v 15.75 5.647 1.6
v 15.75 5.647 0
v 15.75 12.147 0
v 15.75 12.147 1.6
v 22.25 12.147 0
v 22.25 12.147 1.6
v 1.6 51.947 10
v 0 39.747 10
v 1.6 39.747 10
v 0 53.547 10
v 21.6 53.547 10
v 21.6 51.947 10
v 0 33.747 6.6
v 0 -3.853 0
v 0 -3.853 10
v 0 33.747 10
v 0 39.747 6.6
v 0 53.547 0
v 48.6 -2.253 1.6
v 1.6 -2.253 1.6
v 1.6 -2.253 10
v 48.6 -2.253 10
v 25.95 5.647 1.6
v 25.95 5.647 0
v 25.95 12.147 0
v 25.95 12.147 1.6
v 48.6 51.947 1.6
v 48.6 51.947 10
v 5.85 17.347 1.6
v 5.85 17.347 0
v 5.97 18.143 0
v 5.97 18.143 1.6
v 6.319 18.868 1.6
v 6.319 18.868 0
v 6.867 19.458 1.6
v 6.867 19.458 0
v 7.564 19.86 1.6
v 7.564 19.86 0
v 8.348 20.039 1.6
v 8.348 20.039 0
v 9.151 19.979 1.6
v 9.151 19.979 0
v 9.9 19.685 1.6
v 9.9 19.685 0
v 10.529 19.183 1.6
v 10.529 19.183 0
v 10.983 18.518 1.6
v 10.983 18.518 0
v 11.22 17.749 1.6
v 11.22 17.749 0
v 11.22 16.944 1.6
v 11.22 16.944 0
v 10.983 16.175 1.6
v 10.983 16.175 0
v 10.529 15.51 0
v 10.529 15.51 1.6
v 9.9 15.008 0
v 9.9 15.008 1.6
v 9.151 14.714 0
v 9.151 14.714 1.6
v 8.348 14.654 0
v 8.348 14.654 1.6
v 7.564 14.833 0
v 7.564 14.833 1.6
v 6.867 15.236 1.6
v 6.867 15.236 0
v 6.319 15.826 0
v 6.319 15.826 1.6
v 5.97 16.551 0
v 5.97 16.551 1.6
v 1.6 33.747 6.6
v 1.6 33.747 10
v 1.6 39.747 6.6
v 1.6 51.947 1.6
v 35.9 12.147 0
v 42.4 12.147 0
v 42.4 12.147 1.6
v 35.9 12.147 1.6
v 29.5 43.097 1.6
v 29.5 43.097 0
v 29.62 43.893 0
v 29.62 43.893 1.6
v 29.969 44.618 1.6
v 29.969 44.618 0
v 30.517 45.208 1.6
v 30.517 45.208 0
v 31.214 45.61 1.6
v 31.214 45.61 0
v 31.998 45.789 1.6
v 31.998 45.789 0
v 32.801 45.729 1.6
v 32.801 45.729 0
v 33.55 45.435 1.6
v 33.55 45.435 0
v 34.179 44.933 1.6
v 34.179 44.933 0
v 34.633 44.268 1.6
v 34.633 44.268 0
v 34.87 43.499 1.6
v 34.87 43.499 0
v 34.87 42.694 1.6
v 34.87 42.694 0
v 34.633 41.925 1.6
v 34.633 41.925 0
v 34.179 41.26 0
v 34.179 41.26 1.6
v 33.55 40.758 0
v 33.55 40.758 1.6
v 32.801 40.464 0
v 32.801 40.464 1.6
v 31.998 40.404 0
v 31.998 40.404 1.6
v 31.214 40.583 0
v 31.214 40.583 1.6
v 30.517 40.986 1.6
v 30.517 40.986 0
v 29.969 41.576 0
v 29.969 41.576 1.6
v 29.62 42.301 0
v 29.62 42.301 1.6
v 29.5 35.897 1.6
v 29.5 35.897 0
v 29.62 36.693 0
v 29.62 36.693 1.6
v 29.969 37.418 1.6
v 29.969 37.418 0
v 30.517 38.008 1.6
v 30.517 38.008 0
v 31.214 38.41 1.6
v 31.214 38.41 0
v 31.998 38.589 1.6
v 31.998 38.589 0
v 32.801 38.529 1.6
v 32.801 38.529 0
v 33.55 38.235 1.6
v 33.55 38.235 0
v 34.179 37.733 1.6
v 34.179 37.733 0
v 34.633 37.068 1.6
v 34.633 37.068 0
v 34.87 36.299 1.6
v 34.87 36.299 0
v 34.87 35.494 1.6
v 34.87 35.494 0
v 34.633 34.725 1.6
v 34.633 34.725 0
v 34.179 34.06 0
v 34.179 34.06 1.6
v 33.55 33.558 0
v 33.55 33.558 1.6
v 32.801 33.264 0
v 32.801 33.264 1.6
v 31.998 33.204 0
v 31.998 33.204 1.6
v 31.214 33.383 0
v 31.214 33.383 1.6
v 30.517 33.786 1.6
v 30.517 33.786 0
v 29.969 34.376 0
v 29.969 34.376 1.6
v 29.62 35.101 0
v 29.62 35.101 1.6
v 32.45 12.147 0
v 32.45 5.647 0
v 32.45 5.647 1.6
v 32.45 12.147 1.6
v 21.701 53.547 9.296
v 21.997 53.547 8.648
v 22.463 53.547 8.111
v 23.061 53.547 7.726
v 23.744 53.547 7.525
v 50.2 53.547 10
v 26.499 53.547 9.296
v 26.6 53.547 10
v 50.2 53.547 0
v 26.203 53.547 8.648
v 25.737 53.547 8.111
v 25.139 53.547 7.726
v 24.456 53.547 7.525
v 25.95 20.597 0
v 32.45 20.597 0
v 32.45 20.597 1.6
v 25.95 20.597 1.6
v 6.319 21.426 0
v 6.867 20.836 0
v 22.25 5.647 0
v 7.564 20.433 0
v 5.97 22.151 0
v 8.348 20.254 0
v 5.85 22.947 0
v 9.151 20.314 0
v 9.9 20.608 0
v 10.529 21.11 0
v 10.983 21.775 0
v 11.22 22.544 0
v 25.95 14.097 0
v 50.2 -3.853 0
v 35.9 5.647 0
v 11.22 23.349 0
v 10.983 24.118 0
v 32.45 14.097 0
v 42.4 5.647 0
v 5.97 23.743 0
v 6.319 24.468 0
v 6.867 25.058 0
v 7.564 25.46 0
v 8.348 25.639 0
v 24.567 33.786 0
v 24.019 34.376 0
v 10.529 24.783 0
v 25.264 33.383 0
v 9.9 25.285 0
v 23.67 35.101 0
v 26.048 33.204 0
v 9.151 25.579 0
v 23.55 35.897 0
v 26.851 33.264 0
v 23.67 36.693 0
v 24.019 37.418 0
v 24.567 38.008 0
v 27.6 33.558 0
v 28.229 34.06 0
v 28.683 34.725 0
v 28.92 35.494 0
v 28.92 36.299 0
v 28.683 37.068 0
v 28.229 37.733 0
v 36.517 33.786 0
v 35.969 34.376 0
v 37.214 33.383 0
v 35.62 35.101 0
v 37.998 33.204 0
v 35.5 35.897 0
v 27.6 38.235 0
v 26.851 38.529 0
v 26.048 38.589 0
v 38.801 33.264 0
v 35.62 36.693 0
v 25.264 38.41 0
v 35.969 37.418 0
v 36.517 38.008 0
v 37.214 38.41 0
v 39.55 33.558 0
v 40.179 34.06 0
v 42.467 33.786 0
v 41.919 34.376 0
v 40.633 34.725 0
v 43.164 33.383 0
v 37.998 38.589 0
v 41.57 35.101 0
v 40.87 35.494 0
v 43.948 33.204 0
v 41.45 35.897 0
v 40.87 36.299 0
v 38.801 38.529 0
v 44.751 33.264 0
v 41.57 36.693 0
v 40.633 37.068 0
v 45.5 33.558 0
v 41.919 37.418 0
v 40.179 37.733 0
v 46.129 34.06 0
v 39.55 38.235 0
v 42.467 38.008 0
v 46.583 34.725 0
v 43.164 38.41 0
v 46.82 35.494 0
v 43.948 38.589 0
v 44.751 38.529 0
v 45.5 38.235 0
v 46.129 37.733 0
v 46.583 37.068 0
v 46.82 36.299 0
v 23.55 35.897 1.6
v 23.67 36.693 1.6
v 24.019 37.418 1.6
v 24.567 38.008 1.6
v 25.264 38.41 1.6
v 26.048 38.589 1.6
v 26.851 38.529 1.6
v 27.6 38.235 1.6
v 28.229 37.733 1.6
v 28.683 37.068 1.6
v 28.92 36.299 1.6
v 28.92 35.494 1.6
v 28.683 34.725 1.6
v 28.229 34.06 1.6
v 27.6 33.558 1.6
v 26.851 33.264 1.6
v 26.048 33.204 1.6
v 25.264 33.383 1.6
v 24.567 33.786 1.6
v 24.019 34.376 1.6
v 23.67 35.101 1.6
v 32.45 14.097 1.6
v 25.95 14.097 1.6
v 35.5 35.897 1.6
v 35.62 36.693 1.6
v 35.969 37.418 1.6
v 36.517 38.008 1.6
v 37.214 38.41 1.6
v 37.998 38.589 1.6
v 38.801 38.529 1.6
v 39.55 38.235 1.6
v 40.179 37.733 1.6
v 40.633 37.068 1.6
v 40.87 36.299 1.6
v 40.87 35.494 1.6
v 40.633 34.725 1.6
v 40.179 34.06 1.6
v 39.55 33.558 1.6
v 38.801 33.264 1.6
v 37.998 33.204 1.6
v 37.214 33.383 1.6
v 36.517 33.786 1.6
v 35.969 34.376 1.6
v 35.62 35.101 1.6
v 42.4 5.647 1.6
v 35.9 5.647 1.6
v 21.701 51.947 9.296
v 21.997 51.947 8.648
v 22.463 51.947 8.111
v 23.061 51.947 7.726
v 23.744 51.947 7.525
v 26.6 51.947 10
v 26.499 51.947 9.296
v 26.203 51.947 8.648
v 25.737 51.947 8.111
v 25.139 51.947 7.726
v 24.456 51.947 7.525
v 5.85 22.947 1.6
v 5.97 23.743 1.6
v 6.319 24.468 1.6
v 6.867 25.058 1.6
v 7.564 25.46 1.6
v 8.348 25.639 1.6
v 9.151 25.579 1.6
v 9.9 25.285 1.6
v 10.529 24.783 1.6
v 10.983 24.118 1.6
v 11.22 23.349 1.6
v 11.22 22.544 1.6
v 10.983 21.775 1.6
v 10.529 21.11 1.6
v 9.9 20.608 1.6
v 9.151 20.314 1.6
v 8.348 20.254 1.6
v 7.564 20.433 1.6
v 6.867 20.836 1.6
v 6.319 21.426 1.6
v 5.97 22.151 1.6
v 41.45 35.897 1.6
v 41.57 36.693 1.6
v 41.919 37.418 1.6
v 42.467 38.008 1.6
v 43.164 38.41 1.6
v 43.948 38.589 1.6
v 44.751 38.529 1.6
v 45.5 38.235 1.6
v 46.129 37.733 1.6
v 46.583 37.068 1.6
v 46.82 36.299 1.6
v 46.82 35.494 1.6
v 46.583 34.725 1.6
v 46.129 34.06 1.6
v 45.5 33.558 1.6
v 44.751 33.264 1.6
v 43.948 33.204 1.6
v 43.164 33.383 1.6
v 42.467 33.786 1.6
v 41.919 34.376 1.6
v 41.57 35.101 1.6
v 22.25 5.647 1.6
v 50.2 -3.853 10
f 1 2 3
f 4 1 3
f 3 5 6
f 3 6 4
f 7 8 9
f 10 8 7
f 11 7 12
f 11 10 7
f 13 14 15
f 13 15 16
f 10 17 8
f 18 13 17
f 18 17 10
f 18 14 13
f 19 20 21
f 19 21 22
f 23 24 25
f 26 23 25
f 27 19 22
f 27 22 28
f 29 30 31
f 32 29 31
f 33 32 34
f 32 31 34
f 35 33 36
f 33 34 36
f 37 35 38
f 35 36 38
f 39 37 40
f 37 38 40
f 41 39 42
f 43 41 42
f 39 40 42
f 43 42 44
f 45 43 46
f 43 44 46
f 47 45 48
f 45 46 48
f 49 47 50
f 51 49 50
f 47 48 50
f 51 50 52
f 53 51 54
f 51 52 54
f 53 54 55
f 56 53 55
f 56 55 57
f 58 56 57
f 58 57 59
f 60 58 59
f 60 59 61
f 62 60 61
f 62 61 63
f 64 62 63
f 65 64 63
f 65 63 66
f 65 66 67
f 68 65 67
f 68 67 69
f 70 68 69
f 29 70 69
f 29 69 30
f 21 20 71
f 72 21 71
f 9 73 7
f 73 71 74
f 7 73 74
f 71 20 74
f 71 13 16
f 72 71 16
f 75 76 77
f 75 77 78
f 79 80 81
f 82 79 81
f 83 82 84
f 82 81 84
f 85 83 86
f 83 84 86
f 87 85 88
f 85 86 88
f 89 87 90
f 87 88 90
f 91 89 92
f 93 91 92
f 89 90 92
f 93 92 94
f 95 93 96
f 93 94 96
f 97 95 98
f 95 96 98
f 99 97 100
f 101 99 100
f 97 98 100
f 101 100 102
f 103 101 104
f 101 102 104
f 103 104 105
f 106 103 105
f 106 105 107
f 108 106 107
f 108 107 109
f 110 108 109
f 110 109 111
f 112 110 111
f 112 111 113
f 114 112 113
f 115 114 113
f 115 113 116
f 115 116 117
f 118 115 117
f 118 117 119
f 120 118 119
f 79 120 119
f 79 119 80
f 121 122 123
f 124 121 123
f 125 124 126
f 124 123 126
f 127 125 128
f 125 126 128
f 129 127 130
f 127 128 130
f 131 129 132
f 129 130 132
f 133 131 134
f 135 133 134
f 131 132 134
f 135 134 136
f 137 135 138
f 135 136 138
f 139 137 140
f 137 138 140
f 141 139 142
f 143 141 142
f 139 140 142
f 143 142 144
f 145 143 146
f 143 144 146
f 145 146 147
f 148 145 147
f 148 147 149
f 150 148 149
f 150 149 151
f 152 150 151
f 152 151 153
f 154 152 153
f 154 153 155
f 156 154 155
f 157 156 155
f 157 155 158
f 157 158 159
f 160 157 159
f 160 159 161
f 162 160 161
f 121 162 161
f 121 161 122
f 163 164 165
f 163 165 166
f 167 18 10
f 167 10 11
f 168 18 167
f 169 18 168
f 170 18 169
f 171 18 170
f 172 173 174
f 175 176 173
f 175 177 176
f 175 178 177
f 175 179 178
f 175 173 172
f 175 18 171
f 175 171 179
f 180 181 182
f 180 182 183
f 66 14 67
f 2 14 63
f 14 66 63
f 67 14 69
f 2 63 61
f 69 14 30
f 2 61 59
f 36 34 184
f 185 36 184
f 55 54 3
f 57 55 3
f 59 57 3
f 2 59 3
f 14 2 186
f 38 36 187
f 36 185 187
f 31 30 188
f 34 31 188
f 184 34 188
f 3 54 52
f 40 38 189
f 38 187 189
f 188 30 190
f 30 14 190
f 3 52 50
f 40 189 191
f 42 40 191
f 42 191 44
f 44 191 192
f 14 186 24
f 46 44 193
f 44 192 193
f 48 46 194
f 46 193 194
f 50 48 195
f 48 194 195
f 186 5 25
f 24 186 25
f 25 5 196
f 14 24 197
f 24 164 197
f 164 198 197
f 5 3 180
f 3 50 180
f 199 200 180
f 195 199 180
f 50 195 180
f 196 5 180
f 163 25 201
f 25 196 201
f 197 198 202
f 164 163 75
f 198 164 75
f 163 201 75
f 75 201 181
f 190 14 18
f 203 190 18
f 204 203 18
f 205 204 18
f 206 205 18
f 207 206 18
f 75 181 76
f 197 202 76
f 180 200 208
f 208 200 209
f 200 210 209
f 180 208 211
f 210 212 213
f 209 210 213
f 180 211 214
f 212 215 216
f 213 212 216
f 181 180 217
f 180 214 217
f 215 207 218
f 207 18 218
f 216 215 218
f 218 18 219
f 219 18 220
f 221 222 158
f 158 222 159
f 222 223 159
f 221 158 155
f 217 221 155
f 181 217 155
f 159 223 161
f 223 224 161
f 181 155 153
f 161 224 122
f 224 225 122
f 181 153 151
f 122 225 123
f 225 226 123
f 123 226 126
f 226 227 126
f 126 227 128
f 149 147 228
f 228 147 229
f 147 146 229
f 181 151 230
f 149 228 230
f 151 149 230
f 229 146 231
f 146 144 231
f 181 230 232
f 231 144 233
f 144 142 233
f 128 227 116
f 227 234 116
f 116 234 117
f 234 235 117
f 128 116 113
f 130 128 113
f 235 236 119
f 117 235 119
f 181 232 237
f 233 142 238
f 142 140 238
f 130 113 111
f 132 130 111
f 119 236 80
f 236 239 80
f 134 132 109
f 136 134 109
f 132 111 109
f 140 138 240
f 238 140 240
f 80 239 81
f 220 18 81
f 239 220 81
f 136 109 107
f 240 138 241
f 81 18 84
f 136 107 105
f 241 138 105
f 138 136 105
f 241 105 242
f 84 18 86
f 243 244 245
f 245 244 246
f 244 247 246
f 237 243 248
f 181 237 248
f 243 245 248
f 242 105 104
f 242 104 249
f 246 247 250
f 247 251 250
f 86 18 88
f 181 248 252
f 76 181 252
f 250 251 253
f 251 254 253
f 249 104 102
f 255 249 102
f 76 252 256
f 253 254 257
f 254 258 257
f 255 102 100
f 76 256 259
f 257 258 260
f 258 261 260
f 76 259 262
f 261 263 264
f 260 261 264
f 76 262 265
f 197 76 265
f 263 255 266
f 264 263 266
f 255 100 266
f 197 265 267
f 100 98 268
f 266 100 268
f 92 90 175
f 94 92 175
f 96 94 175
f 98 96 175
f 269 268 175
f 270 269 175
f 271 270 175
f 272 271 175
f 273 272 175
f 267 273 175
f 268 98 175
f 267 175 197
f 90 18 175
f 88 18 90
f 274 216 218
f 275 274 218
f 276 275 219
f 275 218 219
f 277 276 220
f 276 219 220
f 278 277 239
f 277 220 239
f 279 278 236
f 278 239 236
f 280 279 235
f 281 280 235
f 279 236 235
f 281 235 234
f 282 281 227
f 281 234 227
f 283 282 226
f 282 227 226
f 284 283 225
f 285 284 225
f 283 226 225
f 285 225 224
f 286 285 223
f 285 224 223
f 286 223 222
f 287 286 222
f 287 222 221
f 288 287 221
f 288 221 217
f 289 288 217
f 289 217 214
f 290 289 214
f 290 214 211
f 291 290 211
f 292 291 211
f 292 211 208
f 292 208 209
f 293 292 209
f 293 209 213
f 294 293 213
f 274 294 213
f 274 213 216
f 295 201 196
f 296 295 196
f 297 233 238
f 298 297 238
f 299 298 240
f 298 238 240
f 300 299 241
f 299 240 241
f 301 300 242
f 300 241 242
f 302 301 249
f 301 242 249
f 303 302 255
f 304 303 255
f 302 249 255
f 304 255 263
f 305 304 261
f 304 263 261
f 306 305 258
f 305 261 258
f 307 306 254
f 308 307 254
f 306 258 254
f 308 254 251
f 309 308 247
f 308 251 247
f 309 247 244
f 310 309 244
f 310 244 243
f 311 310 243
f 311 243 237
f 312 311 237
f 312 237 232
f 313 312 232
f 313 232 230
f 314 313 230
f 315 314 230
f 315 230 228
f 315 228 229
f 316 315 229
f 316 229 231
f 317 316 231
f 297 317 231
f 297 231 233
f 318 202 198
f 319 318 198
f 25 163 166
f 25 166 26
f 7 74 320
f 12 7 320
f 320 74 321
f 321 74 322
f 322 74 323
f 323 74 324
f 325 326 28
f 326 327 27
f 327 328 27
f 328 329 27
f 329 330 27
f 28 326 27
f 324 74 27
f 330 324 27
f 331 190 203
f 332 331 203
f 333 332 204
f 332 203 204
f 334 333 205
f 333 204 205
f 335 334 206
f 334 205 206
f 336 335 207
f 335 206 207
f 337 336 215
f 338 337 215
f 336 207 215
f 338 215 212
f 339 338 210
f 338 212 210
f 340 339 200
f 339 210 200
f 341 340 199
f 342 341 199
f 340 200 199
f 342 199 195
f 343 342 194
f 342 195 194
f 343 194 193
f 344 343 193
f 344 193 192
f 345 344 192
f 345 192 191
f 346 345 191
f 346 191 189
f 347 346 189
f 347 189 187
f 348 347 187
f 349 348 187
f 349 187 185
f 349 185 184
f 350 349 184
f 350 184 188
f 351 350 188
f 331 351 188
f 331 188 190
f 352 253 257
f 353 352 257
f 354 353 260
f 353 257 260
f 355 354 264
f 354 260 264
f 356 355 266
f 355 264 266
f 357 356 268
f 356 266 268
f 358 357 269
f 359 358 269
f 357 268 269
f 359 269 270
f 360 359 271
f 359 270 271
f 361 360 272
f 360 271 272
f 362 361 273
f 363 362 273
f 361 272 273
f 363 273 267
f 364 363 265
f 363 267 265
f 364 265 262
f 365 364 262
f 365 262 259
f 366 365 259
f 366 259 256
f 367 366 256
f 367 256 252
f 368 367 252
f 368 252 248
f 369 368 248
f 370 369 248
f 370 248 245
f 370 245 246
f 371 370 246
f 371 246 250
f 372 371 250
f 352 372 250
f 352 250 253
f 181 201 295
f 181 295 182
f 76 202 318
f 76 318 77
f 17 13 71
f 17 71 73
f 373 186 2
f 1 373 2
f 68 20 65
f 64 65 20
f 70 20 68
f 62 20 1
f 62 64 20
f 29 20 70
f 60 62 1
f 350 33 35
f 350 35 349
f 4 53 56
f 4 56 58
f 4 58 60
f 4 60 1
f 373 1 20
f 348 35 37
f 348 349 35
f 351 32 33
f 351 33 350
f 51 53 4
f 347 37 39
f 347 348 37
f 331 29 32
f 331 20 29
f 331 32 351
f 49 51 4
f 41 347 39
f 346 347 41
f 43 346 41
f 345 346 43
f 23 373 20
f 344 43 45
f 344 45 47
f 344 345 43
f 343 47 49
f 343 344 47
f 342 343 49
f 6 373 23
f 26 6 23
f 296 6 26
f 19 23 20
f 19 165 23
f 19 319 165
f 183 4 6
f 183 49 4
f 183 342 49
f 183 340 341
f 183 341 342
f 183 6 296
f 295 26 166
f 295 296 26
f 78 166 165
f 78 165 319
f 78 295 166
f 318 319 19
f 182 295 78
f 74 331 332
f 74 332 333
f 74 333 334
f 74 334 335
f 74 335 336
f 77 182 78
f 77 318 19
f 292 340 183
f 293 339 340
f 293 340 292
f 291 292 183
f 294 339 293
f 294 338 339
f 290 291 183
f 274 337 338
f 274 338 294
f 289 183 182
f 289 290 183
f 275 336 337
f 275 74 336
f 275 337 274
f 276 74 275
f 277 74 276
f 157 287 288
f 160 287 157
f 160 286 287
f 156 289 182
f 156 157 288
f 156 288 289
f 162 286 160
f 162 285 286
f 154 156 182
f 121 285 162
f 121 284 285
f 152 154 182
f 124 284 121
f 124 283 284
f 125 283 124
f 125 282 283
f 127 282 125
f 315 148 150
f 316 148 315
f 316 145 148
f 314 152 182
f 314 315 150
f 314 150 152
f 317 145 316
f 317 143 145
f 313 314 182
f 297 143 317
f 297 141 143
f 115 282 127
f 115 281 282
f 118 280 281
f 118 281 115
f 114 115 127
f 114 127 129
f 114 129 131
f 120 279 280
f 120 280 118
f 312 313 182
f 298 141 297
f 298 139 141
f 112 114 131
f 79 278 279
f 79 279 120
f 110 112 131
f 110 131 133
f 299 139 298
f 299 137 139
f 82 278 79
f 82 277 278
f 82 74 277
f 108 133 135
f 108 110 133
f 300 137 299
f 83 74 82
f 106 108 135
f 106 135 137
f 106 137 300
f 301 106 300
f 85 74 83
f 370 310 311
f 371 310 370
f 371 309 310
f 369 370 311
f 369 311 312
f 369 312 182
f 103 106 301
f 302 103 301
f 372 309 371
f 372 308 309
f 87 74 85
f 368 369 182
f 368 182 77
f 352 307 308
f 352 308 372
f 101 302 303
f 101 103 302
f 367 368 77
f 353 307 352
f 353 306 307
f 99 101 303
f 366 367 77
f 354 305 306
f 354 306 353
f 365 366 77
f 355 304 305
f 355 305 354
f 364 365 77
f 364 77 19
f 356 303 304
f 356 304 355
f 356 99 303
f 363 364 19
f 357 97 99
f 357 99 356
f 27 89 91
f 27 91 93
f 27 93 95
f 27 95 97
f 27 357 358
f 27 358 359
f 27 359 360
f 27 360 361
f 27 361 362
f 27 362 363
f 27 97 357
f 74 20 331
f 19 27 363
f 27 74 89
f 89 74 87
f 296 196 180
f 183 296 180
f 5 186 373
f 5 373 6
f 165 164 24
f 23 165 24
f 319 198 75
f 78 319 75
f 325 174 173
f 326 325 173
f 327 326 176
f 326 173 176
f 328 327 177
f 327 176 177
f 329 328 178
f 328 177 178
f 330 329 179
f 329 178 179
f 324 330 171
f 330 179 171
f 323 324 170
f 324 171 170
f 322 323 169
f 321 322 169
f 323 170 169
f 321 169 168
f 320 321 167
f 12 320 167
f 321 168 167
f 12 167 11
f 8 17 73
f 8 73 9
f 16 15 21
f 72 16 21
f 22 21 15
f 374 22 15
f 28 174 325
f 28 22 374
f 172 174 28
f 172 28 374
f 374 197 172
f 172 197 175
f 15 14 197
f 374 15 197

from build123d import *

# Parameters (mm, degrees)
SKETCH1_W           = 50.2
SKETCH1_H           = 57.4
BOSS_EXTRUDE1_DEPTH = 10
SHELL1_T            = -1.6
SKETCH2_R           = 2.7
CUT_EXTRUDE1_DEPTH  = 10
SKETCH3_W           = 3.4
SKETCH3_H           = 6
CUT_EXTRUDE2_DEPTH  = 10
SKETCH4_R           = 2.5
CUT_EXTRUDE3_DEPTH  = 10
SKETCH5_W           = 6.5
SKETCH5_H           = 6.5
CUT_EXTRUDE4_DEPTH  = 10


with BuildPart() as part:
    # Sketch1 → Boss-Extrude1 (new body)
    with BuildSketch(Plane.XY):
        with Locations((25.1, 24.846666667)):
            Rectangle(SKETCH1_W, SKETCH1_H)
    extrude(amount=BOSS_EXTRUDE1_DEPTH)

    # Shell1
    shell1_openings = [part.faces().sort_by_distance(p)[0] for p in [
        (25.1, 24.846666667, 10),
    ]]
    offset(amount=SHELL1_T, openings=shell1_openings, kind=Kind.INTERSECTION)

    # Sketch2 → Cut-Extrude1 (cut)
    with BuildSketch(Plane(origin=(0, 0, 0), x_dir=(-1, 0, 0), z_dir=(0, 0, -1))):
        with Locations((-8.55, 17.346666667)):
            Circle(SKETCH2_R)
        with Locations((-8.55, 22.946666667)):
            Circle(SKETCH2_R)
        with Locations((-44.15, 35.896666667)):
            Circle(SKETCH2_R)
        with Locations((-26.25, 35.896666667)):
            Circle(SKETCH2_R)
        with Locations((-38.2, 35.896666667)):
            Circle(SKETCH2_R)
        with Locations((-32.2, 35.896666667)):
            Circle(SKETCH2_R)
        with Locations((-32.2, 43.096666667)):
            Circle(SKETCH2_R)
    extrude(amount=-CUT_EXTRUDE1_DEPTH, mode=Mode.SUBTRACT)

    # Sketch3 → Cut-Extrude2 (cut)
    with BuildSketch(Plane.ZY):
        with Locations((8.3, 36.746666667)):
            Rectangle(SKETCH3_W, SKETCH3_H)
    extrude(amount=-CUT_EXTRUDE2_DEPTH, mode=Mode.SUBTRACT)

    # Sketch4 → Cut-Extrude3 (cut)
    with BuildSketch(Plane(origin=(0, 53.546666667, 0), x_dir=(1, 0, 0), z_dir=(0, 1, 0))):
        with Locations((24.1, -10)):
            Circle(SKETCH4_R)
    extrude(amount=-CUT_EXTRUDE3_DEPTH, mode=Mode.SUBTRACT)

    # Sketch5 → Cut-Extrude4 (cut)
    with BuildSketch(Plane(origin=(0, 0, 0), x_dir=(-1, 0, 0), z_dir=(0, 0, -1))):
        with Locations((-39.15, 8.896666667)):
            Rectangle(SKETCH5_W, SKETCH5_H)
        with Locations((-29.2, 8.896666667)):
            Rectangle(SKETCH5_W, SKETCH5_H)
        with Locations((-19, 8.896666667)):
            Rectangle(SKETCH5_W, SKETCH5_H)
        with Locations((-29.2, 17.346666667)):
            Rectangle(SKETCH5_W, SKETCH5_H)
    extrude(amount=-CUT_EXTRUDE4_DEPTH, mode=Mode.SUBTRACT)


solid = part.part
